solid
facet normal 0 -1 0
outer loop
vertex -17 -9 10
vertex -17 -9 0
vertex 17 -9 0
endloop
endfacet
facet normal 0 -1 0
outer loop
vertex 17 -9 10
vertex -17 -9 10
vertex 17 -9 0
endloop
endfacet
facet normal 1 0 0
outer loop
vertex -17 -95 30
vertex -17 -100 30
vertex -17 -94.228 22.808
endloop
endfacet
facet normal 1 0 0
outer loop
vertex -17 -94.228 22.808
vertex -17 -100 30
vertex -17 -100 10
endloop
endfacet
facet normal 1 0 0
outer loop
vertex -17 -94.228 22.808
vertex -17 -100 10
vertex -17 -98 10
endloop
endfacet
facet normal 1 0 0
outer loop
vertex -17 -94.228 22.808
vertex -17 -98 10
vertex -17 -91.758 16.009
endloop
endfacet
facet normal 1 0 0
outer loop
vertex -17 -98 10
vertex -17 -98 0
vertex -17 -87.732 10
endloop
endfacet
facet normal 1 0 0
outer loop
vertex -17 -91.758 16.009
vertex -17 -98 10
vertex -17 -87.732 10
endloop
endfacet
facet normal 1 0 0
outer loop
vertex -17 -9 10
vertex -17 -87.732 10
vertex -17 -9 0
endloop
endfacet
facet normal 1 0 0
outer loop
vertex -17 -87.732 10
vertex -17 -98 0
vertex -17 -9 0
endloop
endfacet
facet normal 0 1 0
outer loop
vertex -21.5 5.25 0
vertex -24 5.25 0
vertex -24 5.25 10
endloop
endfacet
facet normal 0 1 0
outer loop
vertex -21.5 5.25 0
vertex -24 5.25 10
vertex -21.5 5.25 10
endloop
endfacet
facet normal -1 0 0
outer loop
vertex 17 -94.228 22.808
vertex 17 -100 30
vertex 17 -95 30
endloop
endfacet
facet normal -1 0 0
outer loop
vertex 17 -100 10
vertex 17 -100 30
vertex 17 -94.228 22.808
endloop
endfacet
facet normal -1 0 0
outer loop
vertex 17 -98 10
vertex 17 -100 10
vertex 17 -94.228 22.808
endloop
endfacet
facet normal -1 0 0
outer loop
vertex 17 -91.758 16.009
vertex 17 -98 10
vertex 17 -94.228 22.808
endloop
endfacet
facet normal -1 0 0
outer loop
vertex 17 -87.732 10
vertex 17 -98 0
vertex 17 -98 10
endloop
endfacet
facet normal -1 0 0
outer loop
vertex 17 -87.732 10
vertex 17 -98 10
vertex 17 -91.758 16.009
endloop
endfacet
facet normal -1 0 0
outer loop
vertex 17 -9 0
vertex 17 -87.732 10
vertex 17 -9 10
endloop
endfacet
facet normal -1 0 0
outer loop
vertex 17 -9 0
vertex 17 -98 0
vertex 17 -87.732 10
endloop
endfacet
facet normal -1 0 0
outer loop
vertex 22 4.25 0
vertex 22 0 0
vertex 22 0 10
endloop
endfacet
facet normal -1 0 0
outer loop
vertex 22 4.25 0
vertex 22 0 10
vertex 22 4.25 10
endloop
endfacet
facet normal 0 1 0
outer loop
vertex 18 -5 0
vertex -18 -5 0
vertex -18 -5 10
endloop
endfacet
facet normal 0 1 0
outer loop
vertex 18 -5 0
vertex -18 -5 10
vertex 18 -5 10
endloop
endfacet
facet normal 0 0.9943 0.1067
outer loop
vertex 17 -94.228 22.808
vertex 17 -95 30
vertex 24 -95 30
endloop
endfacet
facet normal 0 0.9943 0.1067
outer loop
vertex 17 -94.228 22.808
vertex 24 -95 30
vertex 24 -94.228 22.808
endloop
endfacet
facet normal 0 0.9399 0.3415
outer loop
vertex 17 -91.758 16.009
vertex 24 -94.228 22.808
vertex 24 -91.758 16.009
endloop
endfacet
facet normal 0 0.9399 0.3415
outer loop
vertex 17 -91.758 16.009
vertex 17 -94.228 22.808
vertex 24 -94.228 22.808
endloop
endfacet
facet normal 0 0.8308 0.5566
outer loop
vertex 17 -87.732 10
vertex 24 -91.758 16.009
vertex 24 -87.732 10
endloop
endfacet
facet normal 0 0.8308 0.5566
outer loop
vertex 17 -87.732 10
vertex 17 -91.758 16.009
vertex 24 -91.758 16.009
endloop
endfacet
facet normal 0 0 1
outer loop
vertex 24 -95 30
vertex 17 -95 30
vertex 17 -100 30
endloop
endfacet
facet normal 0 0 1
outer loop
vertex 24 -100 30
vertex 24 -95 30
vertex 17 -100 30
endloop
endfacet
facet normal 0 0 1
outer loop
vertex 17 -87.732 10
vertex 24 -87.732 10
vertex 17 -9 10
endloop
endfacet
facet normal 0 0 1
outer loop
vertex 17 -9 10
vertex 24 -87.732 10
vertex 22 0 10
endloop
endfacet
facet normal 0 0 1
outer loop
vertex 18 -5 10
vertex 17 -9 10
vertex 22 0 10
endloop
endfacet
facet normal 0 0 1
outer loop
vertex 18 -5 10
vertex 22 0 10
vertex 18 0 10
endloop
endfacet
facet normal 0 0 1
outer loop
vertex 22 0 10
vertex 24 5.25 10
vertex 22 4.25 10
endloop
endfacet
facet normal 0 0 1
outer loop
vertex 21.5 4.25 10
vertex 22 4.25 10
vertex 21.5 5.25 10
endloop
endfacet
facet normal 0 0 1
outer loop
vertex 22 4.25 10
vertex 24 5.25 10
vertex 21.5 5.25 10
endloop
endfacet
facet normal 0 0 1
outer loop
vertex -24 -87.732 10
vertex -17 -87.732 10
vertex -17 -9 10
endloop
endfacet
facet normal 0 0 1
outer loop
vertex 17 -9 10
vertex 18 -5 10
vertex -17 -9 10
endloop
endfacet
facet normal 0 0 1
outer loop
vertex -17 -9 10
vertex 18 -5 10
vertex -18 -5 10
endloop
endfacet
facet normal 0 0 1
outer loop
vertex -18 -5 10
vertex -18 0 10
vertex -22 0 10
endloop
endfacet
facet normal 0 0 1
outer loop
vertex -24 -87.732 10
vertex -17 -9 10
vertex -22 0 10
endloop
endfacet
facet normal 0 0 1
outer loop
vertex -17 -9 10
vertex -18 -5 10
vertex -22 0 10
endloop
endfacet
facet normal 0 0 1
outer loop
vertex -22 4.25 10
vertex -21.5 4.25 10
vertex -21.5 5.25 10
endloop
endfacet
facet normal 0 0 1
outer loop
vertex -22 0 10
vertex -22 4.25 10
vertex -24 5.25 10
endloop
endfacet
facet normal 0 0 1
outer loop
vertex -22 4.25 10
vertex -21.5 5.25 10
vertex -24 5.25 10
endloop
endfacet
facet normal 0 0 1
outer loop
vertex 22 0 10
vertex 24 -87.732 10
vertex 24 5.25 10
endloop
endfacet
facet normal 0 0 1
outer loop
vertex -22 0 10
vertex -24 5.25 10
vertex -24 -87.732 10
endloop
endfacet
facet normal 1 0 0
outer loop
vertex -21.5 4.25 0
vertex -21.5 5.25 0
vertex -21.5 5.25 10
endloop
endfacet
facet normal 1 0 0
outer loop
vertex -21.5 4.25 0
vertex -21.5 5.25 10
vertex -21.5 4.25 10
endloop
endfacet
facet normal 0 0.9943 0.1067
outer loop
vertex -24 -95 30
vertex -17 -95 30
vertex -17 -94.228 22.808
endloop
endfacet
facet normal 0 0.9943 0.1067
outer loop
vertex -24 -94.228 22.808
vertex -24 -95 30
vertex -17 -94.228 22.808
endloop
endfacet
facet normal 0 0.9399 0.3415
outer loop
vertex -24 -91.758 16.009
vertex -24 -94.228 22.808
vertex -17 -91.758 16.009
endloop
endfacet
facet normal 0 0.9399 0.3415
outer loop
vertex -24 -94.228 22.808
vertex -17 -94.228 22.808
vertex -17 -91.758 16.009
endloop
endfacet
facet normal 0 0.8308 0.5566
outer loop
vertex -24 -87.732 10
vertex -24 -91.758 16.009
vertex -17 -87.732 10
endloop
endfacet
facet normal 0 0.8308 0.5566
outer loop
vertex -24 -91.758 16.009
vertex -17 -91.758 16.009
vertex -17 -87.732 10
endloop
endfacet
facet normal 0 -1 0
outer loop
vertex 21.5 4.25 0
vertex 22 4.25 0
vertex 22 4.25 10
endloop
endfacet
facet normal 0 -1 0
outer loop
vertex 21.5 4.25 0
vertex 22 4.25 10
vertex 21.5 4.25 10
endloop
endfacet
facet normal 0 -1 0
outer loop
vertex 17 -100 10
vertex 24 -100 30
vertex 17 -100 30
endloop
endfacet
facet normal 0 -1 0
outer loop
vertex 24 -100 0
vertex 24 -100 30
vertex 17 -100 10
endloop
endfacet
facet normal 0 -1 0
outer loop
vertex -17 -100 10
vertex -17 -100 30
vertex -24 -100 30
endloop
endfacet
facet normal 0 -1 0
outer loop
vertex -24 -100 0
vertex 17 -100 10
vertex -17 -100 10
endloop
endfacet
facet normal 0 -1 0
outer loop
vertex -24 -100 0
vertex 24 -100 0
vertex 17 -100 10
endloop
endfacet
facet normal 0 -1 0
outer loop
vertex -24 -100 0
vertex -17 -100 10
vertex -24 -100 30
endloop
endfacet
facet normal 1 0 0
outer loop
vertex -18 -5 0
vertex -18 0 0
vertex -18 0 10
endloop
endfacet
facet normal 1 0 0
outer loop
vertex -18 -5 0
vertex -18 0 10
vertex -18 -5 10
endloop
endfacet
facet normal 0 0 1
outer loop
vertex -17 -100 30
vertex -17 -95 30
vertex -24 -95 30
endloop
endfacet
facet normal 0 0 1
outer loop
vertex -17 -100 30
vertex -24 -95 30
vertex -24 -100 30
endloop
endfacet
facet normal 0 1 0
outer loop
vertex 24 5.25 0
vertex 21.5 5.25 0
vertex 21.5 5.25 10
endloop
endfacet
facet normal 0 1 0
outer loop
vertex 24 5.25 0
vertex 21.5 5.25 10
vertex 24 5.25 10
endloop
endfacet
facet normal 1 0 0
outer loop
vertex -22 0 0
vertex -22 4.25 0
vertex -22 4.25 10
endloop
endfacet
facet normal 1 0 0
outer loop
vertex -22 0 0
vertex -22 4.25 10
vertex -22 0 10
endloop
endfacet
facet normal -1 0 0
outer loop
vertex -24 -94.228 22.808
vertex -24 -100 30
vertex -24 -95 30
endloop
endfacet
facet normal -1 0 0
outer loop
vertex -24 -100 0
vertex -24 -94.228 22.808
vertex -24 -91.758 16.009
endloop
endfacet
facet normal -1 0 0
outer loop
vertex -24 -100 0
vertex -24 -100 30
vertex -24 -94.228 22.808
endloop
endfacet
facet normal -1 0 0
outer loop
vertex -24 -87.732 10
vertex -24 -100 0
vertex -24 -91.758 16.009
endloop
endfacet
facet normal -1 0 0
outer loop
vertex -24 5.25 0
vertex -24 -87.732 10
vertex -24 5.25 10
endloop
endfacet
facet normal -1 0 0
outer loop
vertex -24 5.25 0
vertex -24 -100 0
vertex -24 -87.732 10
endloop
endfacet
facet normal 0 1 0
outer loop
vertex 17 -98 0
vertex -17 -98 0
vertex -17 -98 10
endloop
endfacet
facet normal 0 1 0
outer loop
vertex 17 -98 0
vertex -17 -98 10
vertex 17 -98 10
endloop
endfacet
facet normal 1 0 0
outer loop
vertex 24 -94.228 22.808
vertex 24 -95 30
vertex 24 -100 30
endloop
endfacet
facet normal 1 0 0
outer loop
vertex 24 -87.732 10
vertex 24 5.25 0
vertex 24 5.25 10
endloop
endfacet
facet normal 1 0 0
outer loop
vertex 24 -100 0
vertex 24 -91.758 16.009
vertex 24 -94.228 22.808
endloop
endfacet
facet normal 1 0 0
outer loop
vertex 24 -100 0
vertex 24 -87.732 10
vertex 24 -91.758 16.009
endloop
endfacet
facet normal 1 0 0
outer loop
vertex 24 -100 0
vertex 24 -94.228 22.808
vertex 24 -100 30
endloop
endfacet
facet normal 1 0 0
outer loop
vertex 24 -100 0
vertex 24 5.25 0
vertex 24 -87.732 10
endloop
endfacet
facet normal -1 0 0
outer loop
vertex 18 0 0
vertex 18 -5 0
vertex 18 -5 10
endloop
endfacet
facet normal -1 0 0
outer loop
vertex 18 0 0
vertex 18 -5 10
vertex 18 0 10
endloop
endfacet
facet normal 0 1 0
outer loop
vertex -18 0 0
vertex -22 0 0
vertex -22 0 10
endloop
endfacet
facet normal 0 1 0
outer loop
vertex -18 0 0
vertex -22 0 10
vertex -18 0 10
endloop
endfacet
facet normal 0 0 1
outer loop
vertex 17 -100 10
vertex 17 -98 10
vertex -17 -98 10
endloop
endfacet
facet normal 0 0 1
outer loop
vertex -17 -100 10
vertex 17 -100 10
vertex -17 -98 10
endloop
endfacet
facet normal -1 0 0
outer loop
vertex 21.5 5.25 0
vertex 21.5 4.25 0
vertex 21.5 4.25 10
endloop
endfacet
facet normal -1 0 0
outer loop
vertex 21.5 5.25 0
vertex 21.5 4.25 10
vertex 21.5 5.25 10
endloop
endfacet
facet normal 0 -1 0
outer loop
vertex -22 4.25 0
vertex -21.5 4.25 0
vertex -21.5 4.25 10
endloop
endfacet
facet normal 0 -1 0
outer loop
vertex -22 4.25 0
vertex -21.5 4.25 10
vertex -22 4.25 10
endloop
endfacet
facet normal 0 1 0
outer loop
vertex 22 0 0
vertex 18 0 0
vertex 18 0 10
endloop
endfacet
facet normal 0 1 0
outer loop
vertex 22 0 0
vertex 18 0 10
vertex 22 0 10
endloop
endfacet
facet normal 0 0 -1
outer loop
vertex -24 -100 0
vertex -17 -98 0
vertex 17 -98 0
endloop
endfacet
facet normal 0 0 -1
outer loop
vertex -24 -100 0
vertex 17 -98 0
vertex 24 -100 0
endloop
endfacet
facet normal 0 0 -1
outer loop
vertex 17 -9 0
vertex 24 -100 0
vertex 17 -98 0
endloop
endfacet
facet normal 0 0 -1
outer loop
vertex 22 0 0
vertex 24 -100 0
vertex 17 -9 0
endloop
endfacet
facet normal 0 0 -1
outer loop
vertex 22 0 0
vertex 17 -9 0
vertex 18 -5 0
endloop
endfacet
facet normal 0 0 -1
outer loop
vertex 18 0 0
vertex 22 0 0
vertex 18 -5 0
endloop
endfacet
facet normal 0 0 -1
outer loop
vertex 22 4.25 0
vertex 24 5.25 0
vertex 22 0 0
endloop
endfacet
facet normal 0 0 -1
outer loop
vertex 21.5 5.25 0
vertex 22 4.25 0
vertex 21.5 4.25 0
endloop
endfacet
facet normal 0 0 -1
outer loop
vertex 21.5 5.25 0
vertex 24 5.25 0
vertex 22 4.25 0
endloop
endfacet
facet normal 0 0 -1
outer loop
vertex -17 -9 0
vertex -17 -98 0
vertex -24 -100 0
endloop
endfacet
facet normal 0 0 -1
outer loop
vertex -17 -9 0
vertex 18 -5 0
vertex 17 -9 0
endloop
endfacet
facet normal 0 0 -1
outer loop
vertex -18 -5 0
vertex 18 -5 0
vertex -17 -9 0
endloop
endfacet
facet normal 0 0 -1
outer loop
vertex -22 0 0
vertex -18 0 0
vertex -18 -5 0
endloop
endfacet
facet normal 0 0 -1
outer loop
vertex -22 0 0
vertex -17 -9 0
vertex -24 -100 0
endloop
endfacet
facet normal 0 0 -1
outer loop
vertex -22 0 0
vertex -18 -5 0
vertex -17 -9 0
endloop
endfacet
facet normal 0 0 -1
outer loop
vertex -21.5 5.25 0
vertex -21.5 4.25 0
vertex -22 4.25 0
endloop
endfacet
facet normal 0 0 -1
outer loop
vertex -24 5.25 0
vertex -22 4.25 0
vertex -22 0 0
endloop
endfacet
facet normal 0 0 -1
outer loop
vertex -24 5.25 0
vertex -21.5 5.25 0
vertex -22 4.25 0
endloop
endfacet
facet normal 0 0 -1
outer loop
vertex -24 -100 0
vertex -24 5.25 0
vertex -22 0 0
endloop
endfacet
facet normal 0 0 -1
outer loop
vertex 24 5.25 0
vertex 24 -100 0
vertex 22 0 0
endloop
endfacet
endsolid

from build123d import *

# Parameters (mm, degrees)
SKETCH_W     = 34
SKETCH_H     = 89
PAD_DEPTH    = 10
PAD001_DEPTH = 7
PAD002_DEPTH = 7


with BuildPart() as part:
    # Sketch → Pad (new body)
    with BuildSketch(Plane.XY):
        Polygon((-22, 0), (-18, 0), (-18, -5), (18, -5), (18, 0), (22, 0), (22, 4.25), (21.5, 4.25), (21.5, 5.25), (24, 5.25), (24, -100), (-24, -100), (-24, 5.25), (-21.5, 5.25), (-21.5, 4.25), (-22, 4.25), align=None)
        with Locations((0, -53.5)):
            Rectangle(SKETCH_W, SKETCH_H, mode=Mode.SUBTRACT)
    extrude(amount=PAD_DEPTH)

    # Sketch001 (on DatumPlane) → Pad001 (join)
    with BuildSketch(Plane.YZ.offset(-17)):
        with BuildLine():
            Line((-100, 0), (-100, 30))
            Line((-95, 30), (-100, 30))
            ThreePointArc((-95, 30), (-88.049566, 10.375362), (-70, 0))
            Line((-100, 0), (-70, 0))
        make_face()
    extrude(amount=-PAD001_DEPTH)

    # Sketch002 (on DatumPlane) → Pad002 (join)
    with BuildSketch(Plane.YZ.offset(17)):
        with BuildLine():
            Line((-100, 0), (-100, 30))
            Line((-95, 30), (-100, 30))
            ThreePointArc((-95, 30), (-88.049566, 10.375362), (-70, 0))
            Line((-100, 0), (-70, 0))
        make_face()
    extrude(amount=PAD002_DEPTH)


solid = part.part
